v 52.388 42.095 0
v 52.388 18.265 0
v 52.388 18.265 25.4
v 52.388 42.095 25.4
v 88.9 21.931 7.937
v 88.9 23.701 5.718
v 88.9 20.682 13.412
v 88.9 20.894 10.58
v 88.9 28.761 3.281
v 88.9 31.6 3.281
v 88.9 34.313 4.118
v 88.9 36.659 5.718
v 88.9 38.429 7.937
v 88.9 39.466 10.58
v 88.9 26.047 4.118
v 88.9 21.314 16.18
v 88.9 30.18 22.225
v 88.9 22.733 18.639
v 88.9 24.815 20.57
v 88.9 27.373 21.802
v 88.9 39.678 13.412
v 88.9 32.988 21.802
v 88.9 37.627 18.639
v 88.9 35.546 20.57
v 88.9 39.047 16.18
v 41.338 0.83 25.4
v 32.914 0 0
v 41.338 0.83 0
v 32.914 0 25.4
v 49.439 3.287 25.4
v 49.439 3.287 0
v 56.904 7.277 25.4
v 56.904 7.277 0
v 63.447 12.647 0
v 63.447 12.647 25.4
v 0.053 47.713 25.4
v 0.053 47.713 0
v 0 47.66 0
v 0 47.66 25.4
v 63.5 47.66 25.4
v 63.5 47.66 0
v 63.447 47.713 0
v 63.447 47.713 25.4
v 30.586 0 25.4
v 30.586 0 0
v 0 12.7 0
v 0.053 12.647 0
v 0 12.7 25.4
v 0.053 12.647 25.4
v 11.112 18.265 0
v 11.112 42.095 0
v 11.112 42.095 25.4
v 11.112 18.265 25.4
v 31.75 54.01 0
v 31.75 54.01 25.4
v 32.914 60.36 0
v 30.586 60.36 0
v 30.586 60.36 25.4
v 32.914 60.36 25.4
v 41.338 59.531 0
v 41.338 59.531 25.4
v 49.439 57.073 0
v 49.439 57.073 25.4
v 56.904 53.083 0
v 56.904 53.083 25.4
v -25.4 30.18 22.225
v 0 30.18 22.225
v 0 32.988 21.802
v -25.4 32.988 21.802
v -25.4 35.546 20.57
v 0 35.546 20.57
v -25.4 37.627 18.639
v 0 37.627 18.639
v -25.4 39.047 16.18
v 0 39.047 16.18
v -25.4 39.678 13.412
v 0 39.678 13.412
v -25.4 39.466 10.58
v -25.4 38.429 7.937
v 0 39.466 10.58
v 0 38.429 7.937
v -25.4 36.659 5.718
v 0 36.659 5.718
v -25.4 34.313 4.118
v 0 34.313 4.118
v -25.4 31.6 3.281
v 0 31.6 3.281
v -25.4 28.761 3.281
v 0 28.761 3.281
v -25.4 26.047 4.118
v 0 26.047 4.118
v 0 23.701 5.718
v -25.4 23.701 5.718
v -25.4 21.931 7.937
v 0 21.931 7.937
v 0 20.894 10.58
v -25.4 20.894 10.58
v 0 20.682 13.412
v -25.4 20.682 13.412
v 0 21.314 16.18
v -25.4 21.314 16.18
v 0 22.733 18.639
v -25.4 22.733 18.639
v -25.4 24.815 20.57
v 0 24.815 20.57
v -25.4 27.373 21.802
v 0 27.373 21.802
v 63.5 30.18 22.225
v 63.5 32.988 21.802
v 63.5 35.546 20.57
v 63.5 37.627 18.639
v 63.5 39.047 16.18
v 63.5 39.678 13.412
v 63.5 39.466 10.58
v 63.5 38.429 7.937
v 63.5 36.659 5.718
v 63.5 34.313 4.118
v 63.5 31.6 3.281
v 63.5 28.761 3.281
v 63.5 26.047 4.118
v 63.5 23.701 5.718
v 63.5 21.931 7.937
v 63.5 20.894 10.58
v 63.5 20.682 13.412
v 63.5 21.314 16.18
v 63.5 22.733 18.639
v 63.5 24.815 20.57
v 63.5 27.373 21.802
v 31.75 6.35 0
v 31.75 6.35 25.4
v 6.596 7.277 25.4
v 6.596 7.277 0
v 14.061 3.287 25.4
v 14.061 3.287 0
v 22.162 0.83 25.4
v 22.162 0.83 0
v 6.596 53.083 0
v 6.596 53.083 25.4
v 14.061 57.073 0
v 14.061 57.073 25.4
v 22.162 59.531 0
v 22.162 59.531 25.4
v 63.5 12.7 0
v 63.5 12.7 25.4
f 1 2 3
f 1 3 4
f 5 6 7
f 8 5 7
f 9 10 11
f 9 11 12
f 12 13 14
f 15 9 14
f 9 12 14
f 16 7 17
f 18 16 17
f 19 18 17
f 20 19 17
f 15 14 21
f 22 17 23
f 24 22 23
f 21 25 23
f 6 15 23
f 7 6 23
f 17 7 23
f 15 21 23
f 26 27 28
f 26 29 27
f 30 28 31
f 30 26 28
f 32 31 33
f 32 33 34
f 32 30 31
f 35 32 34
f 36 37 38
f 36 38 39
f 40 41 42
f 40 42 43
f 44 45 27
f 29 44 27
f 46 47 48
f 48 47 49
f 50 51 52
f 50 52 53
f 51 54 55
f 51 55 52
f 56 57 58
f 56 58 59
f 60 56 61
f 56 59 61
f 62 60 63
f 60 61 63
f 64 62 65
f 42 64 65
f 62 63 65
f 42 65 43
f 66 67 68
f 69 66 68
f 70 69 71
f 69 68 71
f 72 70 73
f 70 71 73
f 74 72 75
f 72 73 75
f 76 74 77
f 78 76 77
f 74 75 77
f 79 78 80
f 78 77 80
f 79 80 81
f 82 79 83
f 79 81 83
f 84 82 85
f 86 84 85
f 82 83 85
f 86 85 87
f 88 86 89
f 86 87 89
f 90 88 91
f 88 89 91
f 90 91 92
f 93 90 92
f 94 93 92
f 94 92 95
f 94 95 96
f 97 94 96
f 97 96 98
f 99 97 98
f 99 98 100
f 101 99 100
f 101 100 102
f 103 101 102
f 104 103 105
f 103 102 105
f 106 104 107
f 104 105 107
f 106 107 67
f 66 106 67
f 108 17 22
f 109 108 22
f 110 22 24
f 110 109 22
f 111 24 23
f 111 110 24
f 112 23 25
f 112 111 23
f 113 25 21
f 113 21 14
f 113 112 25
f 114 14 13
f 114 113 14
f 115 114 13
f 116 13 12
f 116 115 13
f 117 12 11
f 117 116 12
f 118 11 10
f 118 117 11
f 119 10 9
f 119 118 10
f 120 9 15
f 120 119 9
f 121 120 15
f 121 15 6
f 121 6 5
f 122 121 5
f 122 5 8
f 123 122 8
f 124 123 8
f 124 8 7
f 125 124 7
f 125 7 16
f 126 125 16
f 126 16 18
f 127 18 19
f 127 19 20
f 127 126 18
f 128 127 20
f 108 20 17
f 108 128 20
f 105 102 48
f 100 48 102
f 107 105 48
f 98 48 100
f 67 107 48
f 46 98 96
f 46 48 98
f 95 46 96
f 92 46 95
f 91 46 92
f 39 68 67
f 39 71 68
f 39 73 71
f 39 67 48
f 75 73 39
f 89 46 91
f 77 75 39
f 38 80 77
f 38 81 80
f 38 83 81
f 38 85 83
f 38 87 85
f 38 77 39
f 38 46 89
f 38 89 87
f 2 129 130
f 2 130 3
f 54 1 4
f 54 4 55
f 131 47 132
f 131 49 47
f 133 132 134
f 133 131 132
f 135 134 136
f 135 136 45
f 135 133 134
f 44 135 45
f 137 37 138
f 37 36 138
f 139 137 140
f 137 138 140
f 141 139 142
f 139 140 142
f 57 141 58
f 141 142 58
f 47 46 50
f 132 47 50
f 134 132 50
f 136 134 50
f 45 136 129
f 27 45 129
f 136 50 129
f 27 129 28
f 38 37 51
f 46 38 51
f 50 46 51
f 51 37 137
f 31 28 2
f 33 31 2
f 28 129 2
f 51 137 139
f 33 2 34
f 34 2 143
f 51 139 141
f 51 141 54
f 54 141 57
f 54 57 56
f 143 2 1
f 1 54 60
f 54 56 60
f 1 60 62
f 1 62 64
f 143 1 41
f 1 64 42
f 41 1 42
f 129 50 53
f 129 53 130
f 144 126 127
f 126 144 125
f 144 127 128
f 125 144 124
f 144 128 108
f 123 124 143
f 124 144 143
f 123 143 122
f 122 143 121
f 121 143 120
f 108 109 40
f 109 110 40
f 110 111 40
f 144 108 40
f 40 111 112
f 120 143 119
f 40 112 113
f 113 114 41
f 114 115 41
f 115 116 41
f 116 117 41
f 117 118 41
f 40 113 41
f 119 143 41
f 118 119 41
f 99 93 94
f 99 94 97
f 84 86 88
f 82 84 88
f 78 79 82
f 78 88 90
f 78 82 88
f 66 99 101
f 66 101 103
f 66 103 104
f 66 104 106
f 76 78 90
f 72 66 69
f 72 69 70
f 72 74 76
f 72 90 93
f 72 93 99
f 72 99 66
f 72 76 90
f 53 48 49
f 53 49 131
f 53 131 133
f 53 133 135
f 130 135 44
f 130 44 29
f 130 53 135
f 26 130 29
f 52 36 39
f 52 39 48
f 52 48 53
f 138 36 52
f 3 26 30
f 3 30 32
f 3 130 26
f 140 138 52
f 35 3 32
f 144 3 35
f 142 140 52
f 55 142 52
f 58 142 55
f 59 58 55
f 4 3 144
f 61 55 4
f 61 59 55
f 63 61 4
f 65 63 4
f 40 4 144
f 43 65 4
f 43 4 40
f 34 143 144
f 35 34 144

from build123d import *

# Parameters (mm, degrees)
SKETCH1_W           = 63.5
SKETCH1_H           = 60.360264722
BOSS_EXTRUDE1_DEPTH = 25.4
CHAMFER1_SIZE       = 12.7
SKETCH2_R           = 9.525
BOSS_EXTRUDE2_DEPTH = 25.4
FILLET1_R           = 43.18


with BuildPart() as part:
    # Sketch1 → Boss-Extrude1 (new body)
    with BuildSketch(Plane.XY):
        with Locations((31.75, 30.180132361)):
            Rectangle(SKETCH1_W, SKETCH1_H)
        Polygon((11.1125, 42.095198541), (11.1125, 18.26506618), (31.75, 6.35), (52.3875, 18.26506618), (52.3875, 42.095198541), (31.75, 54.010264722), align=None, mode=Mode.SUBTRACT)
    extrude(amount=BOSS_EXTRUDE1_DEPTH)

    # Chamfer1
    chamfer1_edges = [part.edges().sort_by_distance(p)[0] for p in [
        (0, 60.360264722, 12.7),
        (63.5, 60.360264722, 12.7),
        (63.5, 0, 12.7),
        (0, 0, 12.7),
    ]]
    chamfer(chamfer1_edges, length=CHAMFER1_SIZE)

    # Sketch2 → Boss-Extrude2 (add)
    with BuildSketch(Plane.ZY):
        with Locations((12.7, 30.180132361)):
            Circle(SKETCH2_R)
    boss_extrude2 = extrude(amount=BOSS_EXTRUDE2_DEPTH)

    # Mirror1: Boss-Extrude2 across plane
    add(boss_extrude2.mirror(Plane(origin=(31.75, 0, 0), x_dir=(0, 0, 1), z_dir=(1, 0, 0))))

    # Fillet1
    fillet1_edges = [part.edges().sort_by_distance(p)[0] for p in [
        (12.7, 60.360264722, 12.7),
        (50.8, 60.360264722, 12.7),
        (12.7, 0, 12.7),
        (50.8, 0, 12.7),
    ]]
    fillet(fillet1_edges, radius=FILLET1_R)


solid = part.part
